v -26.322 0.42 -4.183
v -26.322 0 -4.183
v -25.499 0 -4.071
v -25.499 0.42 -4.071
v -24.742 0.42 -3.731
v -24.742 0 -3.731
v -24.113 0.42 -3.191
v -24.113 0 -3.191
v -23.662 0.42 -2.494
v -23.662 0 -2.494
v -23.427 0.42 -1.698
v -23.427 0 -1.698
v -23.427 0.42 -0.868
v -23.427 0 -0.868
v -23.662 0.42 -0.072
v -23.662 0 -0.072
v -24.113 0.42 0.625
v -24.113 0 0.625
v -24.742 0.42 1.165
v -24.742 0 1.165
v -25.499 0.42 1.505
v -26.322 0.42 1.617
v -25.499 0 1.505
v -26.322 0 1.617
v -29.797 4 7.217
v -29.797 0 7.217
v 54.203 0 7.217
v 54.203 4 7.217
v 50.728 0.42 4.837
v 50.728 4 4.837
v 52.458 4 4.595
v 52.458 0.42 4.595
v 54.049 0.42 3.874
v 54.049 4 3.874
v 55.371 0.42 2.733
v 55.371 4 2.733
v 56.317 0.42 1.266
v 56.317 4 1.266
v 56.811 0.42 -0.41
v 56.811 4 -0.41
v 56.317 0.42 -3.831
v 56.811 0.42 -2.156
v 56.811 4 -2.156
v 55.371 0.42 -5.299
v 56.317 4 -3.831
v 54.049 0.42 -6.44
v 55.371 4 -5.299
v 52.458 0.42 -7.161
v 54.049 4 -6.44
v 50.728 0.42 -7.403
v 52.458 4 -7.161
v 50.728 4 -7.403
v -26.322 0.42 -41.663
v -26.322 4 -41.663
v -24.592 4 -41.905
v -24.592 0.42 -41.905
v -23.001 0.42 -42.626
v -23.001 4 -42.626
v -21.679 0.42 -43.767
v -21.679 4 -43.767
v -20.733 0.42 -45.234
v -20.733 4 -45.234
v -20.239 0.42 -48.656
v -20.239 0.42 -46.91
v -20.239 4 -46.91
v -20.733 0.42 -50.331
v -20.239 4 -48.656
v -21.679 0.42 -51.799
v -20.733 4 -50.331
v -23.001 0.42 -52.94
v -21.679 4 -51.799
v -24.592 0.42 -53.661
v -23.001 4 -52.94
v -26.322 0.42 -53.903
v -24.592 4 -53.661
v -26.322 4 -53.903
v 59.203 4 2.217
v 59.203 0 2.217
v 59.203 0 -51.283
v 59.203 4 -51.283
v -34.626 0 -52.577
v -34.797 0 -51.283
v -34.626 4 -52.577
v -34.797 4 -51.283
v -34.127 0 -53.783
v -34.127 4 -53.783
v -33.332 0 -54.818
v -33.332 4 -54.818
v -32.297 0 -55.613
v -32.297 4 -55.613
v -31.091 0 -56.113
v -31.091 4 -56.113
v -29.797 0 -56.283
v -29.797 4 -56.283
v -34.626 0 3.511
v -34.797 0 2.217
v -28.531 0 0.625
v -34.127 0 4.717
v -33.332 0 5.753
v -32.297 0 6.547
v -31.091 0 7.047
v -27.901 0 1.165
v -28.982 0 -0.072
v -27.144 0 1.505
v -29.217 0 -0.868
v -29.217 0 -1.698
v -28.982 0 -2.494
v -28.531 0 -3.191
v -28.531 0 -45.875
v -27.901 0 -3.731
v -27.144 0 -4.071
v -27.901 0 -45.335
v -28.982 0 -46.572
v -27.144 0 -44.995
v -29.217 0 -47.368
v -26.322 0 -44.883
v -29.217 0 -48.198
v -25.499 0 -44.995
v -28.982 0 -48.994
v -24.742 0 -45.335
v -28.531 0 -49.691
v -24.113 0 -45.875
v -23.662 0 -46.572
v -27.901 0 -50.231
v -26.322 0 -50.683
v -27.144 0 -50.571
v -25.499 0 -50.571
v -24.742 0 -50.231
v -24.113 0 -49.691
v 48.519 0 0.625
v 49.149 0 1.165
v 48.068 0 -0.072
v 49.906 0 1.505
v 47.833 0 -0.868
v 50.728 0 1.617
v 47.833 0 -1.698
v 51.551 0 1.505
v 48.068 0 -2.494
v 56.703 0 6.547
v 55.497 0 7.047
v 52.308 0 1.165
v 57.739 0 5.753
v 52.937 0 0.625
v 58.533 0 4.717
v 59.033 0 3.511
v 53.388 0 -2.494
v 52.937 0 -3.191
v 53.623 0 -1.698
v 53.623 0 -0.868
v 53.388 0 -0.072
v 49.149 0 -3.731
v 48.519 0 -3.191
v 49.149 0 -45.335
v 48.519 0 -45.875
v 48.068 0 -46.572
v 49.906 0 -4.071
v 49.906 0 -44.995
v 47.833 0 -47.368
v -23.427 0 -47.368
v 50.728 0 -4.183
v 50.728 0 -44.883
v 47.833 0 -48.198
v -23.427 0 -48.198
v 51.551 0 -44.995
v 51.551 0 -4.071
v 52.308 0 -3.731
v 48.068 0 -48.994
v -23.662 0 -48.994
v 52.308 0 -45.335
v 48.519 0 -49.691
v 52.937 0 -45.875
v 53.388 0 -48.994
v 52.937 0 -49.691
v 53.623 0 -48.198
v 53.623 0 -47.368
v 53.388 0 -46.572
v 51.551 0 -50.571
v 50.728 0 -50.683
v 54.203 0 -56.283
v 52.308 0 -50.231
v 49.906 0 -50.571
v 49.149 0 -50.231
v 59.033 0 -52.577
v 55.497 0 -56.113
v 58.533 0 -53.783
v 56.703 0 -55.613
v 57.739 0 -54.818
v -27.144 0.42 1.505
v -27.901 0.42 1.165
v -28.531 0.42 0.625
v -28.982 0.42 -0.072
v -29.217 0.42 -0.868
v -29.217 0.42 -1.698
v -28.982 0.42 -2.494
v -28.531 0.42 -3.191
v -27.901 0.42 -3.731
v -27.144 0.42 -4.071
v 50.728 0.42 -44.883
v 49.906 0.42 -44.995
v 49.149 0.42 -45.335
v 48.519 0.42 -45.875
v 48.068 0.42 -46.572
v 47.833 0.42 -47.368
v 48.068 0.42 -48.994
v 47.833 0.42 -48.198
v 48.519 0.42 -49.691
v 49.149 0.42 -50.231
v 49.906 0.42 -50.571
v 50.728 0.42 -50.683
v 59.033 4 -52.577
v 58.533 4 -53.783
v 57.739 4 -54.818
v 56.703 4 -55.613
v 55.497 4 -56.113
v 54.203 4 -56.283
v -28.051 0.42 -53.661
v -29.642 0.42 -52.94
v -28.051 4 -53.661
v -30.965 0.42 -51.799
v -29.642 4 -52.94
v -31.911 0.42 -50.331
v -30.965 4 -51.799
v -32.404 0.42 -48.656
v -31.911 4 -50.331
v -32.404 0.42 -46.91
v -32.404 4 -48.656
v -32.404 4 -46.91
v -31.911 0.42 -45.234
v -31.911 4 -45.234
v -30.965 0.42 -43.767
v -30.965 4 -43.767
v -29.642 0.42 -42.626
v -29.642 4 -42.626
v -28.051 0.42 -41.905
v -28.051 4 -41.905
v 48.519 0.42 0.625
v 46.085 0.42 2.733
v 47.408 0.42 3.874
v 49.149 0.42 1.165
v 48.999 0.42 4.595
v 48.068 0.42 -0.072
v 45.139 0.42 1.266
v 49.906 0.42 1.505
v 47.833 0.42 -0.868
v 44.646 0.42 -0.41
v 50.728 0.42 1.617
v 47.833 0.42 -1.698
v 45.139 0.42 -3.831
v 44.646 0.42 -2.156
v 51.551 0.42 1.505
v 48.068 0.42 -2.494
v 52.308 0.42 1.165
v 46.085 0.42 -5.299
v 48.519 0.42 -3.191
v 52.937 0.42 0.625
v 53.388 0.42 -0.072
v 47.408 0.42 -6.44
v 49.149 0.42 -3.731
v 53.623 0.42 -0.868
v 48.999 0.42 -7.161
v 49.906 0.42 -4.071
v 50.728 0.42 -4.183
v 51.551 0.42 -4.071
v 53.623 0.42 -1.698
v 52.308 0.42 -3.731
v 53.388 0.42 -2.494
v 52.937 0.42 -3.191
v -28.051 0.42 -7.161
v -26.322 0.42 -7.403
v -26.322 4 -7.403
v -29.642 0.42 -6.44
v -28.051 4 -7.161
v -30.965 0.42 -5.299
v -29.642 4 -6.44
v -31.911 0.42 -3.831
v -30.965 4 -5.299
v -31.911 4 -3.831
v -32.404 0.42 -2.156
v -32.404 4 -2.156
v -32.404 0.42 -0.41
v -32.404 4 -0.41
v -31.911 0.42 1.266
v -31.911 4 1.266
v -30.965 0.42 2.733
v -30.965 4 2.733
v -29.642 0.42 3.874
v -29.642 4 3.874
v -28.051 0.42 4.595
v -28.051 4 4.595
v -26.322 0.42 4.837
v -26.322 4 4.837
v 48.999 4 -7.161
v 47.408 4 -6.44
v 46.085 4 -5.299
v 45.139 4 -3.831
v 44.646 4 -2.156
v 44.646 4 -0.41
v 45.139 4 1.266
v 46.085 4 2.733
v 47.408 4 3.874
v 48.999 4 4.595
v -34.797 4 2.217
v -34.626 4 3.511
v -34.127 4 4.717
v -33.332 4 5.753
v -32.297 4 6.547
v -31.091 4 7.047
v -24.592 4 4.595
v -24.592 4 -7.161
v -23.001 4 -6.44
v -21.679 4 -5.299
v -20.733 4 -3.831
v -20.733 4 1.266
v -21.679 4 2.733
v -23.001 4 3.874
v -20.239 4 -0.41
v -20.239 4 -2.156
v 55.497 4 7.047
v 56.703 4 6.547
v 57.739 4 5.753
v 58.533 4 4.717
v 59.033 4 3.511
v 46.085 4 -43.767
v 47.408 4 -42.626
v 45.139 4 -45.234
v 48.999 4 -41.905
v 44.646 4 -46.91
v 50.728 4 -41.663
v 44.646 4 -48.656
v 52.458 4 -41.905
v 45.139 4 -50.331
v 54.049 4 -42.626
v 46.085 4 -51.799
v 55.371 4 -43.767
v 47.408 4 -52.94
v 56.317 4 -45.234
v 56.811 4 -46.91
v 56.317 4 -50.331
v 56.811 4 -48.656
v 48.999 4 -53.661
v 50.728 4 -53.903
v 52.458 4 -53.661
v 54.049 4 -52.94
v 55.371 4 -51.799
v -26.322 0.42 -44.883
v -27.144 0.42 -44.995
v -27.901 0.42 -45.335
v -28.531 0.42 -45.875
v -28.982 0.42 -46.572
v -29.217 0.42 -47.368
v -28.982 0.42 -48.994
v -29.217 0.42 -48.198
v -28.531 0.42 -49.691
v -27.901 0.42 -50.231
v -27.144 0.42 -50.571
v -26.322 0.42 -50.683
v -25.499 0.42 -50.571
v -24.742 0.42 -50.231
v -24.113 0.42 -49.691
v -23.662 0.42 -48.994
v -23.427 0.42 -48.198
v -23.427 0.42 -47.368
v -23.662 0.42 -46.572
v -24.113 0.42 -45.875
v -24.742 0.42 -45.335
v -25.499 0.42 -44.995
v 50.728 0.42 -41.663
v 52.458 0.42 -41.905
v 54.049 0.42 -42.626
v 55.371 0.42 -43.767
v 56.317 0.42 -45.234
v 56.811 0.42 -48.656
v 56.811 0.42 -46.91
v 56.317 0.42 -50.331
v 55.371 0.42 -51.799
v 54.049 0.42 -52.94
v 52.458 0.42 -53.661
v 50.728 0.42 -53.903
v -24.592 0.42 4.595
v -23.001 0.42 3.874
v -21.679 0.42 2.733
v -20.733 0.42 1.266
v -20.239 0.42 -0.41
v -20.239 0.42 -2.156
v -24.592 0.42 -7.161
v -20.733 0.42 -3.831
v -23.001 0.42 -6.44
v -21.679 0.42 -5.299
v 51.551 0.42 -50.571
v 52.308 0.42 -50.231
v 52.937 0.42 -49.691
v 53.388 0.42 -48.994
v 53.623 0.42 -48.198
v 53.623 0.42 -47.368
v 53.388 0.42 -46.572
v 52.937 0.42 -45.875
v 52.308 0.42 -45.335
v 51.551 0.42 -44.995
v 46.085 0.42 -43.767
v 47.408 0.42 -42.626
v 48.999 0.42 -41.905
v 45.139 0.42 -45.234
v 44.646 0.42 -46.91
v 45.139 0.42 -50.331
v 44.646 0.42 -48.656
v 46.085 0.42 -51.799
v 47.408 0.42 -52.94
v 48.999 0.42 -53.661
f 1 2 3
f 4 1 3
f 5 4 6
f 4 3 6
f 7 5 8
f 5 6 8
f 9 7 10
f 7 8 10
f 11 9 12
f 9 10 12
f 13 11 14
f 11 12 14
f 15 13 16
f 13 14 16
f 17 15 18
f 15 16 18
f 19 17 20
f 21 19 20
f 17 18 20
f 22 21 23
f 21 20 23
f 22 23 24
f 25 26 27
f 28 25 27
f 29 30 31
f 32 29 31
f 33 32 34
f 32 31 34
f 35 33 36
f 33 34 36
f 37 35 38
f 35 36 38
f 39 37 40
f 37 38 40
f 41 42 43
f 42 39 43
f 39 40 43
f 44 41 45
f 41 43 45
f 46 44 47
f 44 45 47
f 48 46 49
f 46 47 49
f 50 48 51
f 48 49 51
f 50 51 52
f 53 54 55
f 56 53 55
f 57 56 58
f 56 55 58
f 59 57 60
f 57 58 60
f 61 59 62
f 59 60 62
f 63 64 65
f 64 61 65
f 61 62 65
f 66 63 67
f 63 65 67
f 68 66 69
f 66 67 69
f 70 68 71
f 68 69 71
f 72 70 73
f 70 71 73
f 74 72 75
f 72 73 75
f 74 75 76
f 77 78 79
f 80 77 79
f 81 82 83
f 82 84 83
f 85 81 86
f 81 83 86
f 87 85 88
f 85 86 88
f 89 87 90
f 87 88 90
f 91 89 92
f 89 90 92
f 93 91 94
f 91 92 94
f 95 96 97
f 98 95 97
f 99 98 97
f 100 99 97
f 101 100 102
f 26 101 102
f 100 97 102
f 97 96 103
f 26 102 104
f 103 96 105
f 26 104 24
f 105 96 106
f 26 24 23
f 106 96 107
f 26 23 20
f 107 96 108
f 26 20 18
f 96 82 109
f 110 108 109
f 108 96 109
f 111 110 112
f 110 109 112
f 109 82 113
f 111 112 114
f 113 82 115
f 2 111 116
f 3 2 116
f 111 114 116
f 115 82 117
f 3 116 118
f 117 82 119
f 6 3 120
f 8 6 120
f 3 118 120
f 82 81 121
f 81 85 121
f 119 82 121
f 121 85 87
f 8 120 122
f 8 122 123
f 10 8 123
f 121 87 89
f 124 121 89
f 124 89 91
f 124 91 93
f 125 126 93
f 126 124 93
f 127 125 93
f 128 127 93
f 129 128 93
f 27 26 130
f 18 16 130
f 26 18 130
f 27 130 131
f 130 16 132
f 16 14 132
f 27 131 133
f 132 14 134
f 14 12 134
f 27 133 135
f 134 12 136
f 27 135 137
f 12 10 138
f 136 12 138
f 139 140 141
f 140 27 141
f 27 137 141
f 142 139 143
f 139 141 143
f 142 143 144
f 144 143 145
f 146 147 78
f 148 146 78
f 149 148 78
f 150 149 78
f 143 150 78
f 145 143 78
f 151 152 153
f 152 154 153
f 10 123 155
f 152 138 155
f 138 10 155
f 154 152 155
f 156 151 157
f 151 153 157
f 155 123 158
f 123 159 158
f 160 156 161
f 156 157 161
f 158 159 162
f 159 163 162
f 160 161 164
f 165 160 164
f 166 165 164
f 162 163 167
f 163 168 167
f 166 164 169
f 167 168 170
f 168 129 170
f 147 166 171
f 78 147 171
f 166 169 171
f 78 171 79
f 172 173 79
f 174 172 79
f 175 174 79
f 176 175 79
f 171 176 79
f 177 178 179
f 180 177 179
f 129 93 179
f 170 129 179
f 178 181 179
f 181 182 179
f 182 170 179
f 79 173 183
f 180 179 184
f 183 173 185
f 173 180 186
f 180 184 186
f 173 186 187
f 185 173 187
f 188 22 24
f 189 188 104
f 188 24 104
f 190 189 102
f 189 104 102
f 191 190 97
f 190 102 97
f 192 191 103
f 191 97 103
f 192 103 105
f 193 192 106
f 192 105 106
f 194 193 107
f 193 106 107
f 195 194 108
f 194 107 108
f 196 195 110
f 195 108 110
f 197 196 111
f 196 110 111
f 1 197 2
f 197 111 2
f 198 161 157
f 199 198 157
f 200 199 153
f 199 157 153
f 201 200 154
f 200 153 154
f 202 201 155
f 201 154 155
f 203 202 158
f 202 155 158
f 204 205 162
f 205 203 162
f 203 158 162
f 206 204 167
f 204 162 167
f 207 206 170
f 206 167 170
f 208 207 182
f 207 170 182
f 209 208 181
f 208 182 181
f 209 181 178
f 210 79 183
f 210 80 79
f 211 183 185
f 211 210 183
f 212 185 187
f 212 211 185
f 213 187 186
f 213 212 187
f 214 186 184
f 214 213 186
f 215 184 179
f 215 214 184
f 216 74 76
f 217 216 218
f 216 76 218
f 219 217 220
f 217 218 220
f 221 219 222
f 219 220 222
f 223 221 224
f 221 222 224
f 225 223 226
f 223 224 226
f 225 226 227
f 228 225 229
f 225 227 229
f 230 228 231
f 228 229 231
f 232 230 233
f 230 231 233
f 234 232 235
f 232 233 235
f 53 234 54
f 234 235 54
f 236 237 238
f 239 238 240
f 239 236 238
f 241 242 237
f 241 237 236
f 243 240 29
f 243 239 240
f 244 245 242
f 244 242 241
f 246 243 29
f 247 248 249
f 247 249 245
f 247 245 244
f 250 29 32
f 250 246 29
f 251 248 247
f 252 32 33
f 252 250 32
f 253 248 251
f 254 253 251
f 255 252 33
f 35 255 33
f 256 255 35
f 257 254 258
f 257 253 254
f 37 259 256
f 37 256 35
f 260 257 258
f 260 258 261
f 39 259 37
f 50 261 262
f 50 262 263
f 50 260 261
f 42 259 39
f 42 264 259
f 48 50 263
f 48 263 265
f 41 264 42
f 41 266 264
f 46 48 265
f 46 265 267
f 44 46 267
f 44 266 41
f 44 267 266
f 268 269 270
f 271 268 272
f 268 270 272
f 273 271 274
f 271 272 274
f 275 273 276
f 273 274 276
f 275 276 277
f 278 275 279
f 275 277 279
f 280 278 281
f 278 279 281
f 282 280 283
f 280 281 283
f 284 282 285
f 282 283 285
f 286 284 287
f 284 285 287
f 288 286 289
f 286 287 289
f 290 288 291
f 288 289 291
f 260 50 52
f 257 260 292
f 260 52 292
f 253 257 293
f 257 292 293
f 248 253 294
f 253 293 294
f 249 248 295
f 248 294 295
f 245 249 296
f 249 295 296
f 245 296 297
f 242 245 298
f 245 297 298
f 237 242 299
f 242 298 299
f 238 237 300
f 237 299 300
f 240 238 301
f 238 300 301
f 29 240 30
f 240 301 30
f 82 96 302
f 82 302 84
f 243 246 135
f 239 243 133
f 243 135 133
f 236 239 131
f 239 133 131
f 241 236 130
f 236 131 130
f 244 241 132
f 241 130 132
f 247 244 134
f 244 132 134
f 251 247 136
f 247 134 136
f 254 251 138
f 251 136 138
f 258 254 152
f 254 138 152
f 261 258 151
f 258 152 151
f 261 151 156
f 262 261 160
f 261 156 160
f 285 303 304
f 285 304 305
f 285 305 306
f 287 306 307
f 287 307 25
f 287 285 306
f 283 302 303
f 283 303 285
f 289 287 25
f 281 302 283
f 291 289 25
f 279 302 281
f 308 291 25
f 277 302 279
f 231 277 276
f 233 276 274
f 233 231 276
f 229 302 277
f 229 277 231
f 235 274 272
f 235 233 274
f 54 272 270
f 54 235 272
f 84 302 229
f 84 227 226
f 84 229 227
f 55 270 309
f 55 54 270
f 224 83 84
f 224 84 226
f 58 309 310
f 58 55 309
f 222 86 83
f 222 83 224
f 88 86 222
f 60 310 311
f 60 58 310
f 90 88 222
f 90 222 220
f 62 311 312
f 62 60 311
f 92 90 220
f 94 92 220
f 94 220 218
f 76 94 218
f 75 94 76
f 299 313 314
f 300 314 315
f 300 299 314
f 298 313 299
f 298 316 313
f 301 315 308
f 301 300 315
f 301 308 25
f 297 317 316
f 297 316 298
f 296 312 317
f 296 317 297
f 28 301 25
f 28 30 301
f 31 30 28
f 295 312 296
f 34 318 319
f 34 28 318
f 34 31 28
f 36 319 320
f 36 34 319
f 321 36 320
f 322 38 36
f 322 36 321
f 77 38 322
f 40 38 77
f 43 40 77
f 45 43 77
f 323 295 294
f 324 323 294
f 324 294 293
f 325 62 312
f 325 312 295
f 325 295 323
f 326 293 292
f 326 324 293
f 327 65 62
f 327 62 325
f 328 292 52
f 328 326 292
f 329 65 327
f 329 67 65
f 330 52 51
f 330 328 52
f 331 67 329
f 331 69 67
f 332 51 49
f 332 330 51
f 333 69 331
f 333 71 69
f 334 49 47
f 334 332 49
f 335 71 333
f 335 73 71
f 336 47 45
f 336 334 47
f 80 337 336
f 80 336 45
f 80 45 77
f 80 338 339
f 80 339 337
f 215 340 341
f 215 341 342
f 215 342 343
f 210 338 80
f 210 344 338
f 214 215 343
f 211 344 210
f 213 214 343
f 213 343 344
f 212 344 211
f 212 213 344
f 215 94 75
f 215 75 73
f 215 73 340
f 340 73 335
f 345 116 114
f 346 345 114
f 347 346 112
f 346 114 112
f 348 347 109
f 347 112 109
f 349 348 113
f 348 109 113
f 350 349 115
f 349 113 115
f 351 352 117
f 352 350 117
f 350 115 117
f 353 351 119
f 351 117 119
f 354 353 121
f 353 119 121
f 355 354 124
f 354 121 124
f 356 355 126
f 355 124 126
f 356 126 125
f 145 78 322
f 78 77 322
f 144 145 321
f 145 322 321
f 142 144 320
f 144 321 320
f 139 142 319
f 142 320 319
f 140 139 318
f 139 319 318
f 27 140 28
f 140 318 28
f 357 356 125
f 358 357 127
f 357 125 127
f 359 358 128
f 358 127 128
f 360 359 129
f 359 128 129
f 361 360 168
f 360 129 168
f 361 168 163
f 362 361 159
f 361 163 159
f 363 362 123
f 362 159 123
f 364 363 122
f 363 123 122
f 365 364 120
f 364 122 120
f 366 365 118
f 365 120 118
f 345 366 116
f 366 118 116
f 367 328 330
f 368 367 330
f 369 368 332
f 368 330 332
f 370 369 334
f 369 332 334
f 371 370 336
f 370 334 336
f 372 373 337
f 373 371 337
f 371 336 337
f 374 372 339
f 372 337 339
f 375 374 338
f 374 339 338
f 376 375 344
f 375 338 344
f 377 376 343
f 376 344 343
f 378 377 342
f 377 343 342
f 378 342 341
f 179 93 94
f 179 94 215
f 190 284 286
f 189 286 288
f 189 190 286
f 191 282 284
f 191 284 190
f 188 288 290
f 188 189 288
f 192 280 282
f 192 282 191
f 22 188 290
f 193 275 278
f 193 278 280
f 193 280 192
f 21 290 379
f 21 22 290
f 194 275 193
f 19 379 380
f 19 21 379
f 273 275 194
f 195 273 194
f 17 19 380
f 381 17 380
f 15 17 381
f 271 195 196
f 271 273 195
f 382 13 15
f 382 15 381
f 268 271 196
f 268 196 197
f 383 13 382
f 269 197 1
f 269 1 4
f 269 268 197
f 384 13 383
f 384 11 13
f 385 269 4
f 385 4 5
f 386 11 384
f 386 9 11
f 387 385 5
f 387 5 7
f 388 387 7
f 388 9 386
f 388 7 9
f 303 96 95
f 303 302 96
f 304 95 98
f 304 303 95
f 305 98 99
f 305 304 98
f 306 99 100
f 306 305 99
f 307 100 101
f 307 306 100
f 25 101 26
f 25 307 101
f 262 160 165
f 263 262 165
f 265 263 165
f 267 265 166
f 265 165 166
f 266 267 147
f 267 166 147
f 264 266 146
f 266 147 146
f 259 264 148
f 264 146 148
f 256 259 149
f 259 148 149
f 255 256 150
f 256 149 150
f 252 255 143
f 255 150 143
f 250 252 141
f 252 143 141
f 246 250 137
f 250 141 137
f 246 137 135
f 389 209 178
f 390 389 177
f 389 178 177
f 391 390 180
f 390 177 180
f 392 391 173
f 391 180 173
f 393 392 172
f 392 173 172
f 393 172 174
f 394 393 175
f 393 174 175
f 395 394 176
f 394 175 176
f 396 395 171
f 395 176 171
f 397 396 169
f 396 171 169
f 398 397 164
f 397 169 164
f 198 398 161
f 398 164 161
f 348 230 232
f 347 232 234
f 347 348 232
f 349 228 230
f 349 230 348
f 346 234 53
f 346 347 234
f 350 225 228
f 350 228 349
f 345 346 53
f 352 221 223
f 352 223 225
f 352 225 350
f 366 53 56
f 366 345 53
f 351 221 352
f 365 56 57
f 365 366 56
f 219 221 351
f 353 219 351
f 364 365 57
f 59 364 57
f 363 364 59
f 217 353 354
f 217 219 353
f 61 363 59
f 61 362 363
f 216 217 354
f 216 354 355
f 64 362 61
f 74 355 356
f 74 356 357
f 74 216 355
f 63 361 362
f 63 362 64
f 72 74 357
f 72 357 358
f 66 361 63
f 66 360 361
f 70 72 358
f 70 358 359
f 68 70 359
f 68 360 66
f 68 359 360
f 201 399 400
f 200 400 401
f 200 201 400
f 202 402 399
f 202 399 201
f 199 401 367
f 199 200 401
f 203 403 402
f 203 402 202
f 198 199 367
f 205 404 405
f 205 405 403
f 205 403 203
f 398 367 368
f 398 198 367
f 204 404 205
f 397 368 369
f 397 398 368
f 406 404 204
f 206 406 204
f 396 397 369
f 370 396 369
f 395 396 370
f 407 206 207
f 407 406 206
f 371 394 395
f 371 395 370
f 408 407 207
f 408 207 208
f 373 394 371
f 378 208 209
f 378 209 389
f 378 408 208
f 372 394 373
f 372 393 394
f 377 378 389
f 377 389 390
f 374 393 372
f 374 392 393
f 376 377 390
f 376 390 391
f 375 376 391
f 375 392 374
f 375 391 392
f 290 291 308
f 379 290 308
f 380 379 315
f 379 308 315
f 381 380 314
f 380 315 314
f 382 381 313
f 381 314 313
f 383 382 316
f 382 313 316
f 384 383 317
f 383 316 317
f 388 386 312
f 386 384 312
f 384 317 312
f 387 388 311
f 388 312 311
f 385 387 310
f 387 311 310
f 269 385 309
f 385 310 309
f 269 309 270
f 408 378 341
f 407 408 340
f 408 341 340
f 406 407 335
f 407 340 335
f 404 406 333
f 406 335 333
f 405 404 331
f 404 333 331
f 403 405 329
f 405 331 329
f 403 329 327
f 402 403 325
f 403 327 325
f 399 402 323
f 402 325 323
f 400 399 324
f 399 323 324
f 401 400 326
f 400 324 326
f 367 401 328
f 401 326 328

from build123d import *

# Parameters (mm, degrees)
SKETCH1_W                                    = 94
SKETCH1_H                                    = 63.5
BOSS_EXTRUDE1_DEPTH                          = 4
CBORE_SLOT_FOR_M5_HEX_HEAD_BOLT1_D           = 5.8
CBORE_SLOT_FOR_M5_HEX_HEAD_BOLT1_DEPTH       = 18
CBORE_SLOT_FOR_M5_HEX_HEAD_BOLT1_CBORE_D     = 12.24
CBORE_SLOT_FOR_M5_HEX_HEAD_BOLT1_CBORE_DEPTH = 3.58
CBORE_SLOT_FOR_M5_HEX_HEAD_BOLT1_TIP         = 1.742495795
FILLET1_R                                    = 5


with BuildPart() as part:
    # Sketch1 → Boss-Extrude1 (new body)
    with BuildSketch(Plane(origin=(0, 0, 0), x_dir=(1, 0, 0), z_dir=(0, 1, 0))):
        with Locations((12.203186111, 24.532883045)):
            Rectangle(SKETCH1_W, SKETCH1_H)
    extrude(amount=BOSS_EXTRUDE1_DEPTH)

    # CBORE SLOT for M5 Hex Head Bolt1
    with Locations(Plane(origin=(0, 4, 0), x_dir=(1, 0, 0), z_dir=(0, 1, 0))):
        with Locations((-26.296813889, 47.782883045), (-26.296813889, 1.282883045), (50.753186111, 47.782883045), (50.753186111, 1.282883045), (-26.346813889, 47.782883045), (-26.346813889, 1.282883045), (50.703186111, 1.282883045), (50.703186111, 47.782883045)):
            CounterBoreHole(CBORE_SLOT_FOR_M5_HEX_HEAD_BOLT1_D / 2, CBORE_SLOT_FOR_M5_HEX_HEAD_BOLT1_CBORE_D / 2, CBORE_SLOT_FOR_M5_HEX_HEAD_BOLT1_CBORE_DEPTH, depth=CBORE_SLOT_FOR_M5_HEX_HEAD_BOLT1_DEPTH)
            with Locations((0, 0, -(CBORE_SLOT_FOR_M5_HEX_HEAD_BOLT1_DEPTH + CBORE_SLOT_FOR_M5_HEX_HEAD_BOLT1_TIP / 2))):  # 118° drill point
                Cone(0, CBORE_SLOT_FOR_M5_HEX_HEAD_BOLT1_D / 2, CBORE_SLOT_FOR_M5_HEX_HEAD_BOLT1_TIP, mode=Mode.SUBTRACT)

    # Fillet1
    fillet1_edges = [part.edges().sort_by_distance(p)[0] for p in [
        (-34.796813889, 2, -56.282883045),
        (59.203186111, 2, -56.282883045),
        (59.203186111, 2, 7.217116955),
        (-34.796813889, 2, 7.217116955),
    ]]
    fillet(fillet1_edges, radius=FILLET1_R)


solid = part.part
